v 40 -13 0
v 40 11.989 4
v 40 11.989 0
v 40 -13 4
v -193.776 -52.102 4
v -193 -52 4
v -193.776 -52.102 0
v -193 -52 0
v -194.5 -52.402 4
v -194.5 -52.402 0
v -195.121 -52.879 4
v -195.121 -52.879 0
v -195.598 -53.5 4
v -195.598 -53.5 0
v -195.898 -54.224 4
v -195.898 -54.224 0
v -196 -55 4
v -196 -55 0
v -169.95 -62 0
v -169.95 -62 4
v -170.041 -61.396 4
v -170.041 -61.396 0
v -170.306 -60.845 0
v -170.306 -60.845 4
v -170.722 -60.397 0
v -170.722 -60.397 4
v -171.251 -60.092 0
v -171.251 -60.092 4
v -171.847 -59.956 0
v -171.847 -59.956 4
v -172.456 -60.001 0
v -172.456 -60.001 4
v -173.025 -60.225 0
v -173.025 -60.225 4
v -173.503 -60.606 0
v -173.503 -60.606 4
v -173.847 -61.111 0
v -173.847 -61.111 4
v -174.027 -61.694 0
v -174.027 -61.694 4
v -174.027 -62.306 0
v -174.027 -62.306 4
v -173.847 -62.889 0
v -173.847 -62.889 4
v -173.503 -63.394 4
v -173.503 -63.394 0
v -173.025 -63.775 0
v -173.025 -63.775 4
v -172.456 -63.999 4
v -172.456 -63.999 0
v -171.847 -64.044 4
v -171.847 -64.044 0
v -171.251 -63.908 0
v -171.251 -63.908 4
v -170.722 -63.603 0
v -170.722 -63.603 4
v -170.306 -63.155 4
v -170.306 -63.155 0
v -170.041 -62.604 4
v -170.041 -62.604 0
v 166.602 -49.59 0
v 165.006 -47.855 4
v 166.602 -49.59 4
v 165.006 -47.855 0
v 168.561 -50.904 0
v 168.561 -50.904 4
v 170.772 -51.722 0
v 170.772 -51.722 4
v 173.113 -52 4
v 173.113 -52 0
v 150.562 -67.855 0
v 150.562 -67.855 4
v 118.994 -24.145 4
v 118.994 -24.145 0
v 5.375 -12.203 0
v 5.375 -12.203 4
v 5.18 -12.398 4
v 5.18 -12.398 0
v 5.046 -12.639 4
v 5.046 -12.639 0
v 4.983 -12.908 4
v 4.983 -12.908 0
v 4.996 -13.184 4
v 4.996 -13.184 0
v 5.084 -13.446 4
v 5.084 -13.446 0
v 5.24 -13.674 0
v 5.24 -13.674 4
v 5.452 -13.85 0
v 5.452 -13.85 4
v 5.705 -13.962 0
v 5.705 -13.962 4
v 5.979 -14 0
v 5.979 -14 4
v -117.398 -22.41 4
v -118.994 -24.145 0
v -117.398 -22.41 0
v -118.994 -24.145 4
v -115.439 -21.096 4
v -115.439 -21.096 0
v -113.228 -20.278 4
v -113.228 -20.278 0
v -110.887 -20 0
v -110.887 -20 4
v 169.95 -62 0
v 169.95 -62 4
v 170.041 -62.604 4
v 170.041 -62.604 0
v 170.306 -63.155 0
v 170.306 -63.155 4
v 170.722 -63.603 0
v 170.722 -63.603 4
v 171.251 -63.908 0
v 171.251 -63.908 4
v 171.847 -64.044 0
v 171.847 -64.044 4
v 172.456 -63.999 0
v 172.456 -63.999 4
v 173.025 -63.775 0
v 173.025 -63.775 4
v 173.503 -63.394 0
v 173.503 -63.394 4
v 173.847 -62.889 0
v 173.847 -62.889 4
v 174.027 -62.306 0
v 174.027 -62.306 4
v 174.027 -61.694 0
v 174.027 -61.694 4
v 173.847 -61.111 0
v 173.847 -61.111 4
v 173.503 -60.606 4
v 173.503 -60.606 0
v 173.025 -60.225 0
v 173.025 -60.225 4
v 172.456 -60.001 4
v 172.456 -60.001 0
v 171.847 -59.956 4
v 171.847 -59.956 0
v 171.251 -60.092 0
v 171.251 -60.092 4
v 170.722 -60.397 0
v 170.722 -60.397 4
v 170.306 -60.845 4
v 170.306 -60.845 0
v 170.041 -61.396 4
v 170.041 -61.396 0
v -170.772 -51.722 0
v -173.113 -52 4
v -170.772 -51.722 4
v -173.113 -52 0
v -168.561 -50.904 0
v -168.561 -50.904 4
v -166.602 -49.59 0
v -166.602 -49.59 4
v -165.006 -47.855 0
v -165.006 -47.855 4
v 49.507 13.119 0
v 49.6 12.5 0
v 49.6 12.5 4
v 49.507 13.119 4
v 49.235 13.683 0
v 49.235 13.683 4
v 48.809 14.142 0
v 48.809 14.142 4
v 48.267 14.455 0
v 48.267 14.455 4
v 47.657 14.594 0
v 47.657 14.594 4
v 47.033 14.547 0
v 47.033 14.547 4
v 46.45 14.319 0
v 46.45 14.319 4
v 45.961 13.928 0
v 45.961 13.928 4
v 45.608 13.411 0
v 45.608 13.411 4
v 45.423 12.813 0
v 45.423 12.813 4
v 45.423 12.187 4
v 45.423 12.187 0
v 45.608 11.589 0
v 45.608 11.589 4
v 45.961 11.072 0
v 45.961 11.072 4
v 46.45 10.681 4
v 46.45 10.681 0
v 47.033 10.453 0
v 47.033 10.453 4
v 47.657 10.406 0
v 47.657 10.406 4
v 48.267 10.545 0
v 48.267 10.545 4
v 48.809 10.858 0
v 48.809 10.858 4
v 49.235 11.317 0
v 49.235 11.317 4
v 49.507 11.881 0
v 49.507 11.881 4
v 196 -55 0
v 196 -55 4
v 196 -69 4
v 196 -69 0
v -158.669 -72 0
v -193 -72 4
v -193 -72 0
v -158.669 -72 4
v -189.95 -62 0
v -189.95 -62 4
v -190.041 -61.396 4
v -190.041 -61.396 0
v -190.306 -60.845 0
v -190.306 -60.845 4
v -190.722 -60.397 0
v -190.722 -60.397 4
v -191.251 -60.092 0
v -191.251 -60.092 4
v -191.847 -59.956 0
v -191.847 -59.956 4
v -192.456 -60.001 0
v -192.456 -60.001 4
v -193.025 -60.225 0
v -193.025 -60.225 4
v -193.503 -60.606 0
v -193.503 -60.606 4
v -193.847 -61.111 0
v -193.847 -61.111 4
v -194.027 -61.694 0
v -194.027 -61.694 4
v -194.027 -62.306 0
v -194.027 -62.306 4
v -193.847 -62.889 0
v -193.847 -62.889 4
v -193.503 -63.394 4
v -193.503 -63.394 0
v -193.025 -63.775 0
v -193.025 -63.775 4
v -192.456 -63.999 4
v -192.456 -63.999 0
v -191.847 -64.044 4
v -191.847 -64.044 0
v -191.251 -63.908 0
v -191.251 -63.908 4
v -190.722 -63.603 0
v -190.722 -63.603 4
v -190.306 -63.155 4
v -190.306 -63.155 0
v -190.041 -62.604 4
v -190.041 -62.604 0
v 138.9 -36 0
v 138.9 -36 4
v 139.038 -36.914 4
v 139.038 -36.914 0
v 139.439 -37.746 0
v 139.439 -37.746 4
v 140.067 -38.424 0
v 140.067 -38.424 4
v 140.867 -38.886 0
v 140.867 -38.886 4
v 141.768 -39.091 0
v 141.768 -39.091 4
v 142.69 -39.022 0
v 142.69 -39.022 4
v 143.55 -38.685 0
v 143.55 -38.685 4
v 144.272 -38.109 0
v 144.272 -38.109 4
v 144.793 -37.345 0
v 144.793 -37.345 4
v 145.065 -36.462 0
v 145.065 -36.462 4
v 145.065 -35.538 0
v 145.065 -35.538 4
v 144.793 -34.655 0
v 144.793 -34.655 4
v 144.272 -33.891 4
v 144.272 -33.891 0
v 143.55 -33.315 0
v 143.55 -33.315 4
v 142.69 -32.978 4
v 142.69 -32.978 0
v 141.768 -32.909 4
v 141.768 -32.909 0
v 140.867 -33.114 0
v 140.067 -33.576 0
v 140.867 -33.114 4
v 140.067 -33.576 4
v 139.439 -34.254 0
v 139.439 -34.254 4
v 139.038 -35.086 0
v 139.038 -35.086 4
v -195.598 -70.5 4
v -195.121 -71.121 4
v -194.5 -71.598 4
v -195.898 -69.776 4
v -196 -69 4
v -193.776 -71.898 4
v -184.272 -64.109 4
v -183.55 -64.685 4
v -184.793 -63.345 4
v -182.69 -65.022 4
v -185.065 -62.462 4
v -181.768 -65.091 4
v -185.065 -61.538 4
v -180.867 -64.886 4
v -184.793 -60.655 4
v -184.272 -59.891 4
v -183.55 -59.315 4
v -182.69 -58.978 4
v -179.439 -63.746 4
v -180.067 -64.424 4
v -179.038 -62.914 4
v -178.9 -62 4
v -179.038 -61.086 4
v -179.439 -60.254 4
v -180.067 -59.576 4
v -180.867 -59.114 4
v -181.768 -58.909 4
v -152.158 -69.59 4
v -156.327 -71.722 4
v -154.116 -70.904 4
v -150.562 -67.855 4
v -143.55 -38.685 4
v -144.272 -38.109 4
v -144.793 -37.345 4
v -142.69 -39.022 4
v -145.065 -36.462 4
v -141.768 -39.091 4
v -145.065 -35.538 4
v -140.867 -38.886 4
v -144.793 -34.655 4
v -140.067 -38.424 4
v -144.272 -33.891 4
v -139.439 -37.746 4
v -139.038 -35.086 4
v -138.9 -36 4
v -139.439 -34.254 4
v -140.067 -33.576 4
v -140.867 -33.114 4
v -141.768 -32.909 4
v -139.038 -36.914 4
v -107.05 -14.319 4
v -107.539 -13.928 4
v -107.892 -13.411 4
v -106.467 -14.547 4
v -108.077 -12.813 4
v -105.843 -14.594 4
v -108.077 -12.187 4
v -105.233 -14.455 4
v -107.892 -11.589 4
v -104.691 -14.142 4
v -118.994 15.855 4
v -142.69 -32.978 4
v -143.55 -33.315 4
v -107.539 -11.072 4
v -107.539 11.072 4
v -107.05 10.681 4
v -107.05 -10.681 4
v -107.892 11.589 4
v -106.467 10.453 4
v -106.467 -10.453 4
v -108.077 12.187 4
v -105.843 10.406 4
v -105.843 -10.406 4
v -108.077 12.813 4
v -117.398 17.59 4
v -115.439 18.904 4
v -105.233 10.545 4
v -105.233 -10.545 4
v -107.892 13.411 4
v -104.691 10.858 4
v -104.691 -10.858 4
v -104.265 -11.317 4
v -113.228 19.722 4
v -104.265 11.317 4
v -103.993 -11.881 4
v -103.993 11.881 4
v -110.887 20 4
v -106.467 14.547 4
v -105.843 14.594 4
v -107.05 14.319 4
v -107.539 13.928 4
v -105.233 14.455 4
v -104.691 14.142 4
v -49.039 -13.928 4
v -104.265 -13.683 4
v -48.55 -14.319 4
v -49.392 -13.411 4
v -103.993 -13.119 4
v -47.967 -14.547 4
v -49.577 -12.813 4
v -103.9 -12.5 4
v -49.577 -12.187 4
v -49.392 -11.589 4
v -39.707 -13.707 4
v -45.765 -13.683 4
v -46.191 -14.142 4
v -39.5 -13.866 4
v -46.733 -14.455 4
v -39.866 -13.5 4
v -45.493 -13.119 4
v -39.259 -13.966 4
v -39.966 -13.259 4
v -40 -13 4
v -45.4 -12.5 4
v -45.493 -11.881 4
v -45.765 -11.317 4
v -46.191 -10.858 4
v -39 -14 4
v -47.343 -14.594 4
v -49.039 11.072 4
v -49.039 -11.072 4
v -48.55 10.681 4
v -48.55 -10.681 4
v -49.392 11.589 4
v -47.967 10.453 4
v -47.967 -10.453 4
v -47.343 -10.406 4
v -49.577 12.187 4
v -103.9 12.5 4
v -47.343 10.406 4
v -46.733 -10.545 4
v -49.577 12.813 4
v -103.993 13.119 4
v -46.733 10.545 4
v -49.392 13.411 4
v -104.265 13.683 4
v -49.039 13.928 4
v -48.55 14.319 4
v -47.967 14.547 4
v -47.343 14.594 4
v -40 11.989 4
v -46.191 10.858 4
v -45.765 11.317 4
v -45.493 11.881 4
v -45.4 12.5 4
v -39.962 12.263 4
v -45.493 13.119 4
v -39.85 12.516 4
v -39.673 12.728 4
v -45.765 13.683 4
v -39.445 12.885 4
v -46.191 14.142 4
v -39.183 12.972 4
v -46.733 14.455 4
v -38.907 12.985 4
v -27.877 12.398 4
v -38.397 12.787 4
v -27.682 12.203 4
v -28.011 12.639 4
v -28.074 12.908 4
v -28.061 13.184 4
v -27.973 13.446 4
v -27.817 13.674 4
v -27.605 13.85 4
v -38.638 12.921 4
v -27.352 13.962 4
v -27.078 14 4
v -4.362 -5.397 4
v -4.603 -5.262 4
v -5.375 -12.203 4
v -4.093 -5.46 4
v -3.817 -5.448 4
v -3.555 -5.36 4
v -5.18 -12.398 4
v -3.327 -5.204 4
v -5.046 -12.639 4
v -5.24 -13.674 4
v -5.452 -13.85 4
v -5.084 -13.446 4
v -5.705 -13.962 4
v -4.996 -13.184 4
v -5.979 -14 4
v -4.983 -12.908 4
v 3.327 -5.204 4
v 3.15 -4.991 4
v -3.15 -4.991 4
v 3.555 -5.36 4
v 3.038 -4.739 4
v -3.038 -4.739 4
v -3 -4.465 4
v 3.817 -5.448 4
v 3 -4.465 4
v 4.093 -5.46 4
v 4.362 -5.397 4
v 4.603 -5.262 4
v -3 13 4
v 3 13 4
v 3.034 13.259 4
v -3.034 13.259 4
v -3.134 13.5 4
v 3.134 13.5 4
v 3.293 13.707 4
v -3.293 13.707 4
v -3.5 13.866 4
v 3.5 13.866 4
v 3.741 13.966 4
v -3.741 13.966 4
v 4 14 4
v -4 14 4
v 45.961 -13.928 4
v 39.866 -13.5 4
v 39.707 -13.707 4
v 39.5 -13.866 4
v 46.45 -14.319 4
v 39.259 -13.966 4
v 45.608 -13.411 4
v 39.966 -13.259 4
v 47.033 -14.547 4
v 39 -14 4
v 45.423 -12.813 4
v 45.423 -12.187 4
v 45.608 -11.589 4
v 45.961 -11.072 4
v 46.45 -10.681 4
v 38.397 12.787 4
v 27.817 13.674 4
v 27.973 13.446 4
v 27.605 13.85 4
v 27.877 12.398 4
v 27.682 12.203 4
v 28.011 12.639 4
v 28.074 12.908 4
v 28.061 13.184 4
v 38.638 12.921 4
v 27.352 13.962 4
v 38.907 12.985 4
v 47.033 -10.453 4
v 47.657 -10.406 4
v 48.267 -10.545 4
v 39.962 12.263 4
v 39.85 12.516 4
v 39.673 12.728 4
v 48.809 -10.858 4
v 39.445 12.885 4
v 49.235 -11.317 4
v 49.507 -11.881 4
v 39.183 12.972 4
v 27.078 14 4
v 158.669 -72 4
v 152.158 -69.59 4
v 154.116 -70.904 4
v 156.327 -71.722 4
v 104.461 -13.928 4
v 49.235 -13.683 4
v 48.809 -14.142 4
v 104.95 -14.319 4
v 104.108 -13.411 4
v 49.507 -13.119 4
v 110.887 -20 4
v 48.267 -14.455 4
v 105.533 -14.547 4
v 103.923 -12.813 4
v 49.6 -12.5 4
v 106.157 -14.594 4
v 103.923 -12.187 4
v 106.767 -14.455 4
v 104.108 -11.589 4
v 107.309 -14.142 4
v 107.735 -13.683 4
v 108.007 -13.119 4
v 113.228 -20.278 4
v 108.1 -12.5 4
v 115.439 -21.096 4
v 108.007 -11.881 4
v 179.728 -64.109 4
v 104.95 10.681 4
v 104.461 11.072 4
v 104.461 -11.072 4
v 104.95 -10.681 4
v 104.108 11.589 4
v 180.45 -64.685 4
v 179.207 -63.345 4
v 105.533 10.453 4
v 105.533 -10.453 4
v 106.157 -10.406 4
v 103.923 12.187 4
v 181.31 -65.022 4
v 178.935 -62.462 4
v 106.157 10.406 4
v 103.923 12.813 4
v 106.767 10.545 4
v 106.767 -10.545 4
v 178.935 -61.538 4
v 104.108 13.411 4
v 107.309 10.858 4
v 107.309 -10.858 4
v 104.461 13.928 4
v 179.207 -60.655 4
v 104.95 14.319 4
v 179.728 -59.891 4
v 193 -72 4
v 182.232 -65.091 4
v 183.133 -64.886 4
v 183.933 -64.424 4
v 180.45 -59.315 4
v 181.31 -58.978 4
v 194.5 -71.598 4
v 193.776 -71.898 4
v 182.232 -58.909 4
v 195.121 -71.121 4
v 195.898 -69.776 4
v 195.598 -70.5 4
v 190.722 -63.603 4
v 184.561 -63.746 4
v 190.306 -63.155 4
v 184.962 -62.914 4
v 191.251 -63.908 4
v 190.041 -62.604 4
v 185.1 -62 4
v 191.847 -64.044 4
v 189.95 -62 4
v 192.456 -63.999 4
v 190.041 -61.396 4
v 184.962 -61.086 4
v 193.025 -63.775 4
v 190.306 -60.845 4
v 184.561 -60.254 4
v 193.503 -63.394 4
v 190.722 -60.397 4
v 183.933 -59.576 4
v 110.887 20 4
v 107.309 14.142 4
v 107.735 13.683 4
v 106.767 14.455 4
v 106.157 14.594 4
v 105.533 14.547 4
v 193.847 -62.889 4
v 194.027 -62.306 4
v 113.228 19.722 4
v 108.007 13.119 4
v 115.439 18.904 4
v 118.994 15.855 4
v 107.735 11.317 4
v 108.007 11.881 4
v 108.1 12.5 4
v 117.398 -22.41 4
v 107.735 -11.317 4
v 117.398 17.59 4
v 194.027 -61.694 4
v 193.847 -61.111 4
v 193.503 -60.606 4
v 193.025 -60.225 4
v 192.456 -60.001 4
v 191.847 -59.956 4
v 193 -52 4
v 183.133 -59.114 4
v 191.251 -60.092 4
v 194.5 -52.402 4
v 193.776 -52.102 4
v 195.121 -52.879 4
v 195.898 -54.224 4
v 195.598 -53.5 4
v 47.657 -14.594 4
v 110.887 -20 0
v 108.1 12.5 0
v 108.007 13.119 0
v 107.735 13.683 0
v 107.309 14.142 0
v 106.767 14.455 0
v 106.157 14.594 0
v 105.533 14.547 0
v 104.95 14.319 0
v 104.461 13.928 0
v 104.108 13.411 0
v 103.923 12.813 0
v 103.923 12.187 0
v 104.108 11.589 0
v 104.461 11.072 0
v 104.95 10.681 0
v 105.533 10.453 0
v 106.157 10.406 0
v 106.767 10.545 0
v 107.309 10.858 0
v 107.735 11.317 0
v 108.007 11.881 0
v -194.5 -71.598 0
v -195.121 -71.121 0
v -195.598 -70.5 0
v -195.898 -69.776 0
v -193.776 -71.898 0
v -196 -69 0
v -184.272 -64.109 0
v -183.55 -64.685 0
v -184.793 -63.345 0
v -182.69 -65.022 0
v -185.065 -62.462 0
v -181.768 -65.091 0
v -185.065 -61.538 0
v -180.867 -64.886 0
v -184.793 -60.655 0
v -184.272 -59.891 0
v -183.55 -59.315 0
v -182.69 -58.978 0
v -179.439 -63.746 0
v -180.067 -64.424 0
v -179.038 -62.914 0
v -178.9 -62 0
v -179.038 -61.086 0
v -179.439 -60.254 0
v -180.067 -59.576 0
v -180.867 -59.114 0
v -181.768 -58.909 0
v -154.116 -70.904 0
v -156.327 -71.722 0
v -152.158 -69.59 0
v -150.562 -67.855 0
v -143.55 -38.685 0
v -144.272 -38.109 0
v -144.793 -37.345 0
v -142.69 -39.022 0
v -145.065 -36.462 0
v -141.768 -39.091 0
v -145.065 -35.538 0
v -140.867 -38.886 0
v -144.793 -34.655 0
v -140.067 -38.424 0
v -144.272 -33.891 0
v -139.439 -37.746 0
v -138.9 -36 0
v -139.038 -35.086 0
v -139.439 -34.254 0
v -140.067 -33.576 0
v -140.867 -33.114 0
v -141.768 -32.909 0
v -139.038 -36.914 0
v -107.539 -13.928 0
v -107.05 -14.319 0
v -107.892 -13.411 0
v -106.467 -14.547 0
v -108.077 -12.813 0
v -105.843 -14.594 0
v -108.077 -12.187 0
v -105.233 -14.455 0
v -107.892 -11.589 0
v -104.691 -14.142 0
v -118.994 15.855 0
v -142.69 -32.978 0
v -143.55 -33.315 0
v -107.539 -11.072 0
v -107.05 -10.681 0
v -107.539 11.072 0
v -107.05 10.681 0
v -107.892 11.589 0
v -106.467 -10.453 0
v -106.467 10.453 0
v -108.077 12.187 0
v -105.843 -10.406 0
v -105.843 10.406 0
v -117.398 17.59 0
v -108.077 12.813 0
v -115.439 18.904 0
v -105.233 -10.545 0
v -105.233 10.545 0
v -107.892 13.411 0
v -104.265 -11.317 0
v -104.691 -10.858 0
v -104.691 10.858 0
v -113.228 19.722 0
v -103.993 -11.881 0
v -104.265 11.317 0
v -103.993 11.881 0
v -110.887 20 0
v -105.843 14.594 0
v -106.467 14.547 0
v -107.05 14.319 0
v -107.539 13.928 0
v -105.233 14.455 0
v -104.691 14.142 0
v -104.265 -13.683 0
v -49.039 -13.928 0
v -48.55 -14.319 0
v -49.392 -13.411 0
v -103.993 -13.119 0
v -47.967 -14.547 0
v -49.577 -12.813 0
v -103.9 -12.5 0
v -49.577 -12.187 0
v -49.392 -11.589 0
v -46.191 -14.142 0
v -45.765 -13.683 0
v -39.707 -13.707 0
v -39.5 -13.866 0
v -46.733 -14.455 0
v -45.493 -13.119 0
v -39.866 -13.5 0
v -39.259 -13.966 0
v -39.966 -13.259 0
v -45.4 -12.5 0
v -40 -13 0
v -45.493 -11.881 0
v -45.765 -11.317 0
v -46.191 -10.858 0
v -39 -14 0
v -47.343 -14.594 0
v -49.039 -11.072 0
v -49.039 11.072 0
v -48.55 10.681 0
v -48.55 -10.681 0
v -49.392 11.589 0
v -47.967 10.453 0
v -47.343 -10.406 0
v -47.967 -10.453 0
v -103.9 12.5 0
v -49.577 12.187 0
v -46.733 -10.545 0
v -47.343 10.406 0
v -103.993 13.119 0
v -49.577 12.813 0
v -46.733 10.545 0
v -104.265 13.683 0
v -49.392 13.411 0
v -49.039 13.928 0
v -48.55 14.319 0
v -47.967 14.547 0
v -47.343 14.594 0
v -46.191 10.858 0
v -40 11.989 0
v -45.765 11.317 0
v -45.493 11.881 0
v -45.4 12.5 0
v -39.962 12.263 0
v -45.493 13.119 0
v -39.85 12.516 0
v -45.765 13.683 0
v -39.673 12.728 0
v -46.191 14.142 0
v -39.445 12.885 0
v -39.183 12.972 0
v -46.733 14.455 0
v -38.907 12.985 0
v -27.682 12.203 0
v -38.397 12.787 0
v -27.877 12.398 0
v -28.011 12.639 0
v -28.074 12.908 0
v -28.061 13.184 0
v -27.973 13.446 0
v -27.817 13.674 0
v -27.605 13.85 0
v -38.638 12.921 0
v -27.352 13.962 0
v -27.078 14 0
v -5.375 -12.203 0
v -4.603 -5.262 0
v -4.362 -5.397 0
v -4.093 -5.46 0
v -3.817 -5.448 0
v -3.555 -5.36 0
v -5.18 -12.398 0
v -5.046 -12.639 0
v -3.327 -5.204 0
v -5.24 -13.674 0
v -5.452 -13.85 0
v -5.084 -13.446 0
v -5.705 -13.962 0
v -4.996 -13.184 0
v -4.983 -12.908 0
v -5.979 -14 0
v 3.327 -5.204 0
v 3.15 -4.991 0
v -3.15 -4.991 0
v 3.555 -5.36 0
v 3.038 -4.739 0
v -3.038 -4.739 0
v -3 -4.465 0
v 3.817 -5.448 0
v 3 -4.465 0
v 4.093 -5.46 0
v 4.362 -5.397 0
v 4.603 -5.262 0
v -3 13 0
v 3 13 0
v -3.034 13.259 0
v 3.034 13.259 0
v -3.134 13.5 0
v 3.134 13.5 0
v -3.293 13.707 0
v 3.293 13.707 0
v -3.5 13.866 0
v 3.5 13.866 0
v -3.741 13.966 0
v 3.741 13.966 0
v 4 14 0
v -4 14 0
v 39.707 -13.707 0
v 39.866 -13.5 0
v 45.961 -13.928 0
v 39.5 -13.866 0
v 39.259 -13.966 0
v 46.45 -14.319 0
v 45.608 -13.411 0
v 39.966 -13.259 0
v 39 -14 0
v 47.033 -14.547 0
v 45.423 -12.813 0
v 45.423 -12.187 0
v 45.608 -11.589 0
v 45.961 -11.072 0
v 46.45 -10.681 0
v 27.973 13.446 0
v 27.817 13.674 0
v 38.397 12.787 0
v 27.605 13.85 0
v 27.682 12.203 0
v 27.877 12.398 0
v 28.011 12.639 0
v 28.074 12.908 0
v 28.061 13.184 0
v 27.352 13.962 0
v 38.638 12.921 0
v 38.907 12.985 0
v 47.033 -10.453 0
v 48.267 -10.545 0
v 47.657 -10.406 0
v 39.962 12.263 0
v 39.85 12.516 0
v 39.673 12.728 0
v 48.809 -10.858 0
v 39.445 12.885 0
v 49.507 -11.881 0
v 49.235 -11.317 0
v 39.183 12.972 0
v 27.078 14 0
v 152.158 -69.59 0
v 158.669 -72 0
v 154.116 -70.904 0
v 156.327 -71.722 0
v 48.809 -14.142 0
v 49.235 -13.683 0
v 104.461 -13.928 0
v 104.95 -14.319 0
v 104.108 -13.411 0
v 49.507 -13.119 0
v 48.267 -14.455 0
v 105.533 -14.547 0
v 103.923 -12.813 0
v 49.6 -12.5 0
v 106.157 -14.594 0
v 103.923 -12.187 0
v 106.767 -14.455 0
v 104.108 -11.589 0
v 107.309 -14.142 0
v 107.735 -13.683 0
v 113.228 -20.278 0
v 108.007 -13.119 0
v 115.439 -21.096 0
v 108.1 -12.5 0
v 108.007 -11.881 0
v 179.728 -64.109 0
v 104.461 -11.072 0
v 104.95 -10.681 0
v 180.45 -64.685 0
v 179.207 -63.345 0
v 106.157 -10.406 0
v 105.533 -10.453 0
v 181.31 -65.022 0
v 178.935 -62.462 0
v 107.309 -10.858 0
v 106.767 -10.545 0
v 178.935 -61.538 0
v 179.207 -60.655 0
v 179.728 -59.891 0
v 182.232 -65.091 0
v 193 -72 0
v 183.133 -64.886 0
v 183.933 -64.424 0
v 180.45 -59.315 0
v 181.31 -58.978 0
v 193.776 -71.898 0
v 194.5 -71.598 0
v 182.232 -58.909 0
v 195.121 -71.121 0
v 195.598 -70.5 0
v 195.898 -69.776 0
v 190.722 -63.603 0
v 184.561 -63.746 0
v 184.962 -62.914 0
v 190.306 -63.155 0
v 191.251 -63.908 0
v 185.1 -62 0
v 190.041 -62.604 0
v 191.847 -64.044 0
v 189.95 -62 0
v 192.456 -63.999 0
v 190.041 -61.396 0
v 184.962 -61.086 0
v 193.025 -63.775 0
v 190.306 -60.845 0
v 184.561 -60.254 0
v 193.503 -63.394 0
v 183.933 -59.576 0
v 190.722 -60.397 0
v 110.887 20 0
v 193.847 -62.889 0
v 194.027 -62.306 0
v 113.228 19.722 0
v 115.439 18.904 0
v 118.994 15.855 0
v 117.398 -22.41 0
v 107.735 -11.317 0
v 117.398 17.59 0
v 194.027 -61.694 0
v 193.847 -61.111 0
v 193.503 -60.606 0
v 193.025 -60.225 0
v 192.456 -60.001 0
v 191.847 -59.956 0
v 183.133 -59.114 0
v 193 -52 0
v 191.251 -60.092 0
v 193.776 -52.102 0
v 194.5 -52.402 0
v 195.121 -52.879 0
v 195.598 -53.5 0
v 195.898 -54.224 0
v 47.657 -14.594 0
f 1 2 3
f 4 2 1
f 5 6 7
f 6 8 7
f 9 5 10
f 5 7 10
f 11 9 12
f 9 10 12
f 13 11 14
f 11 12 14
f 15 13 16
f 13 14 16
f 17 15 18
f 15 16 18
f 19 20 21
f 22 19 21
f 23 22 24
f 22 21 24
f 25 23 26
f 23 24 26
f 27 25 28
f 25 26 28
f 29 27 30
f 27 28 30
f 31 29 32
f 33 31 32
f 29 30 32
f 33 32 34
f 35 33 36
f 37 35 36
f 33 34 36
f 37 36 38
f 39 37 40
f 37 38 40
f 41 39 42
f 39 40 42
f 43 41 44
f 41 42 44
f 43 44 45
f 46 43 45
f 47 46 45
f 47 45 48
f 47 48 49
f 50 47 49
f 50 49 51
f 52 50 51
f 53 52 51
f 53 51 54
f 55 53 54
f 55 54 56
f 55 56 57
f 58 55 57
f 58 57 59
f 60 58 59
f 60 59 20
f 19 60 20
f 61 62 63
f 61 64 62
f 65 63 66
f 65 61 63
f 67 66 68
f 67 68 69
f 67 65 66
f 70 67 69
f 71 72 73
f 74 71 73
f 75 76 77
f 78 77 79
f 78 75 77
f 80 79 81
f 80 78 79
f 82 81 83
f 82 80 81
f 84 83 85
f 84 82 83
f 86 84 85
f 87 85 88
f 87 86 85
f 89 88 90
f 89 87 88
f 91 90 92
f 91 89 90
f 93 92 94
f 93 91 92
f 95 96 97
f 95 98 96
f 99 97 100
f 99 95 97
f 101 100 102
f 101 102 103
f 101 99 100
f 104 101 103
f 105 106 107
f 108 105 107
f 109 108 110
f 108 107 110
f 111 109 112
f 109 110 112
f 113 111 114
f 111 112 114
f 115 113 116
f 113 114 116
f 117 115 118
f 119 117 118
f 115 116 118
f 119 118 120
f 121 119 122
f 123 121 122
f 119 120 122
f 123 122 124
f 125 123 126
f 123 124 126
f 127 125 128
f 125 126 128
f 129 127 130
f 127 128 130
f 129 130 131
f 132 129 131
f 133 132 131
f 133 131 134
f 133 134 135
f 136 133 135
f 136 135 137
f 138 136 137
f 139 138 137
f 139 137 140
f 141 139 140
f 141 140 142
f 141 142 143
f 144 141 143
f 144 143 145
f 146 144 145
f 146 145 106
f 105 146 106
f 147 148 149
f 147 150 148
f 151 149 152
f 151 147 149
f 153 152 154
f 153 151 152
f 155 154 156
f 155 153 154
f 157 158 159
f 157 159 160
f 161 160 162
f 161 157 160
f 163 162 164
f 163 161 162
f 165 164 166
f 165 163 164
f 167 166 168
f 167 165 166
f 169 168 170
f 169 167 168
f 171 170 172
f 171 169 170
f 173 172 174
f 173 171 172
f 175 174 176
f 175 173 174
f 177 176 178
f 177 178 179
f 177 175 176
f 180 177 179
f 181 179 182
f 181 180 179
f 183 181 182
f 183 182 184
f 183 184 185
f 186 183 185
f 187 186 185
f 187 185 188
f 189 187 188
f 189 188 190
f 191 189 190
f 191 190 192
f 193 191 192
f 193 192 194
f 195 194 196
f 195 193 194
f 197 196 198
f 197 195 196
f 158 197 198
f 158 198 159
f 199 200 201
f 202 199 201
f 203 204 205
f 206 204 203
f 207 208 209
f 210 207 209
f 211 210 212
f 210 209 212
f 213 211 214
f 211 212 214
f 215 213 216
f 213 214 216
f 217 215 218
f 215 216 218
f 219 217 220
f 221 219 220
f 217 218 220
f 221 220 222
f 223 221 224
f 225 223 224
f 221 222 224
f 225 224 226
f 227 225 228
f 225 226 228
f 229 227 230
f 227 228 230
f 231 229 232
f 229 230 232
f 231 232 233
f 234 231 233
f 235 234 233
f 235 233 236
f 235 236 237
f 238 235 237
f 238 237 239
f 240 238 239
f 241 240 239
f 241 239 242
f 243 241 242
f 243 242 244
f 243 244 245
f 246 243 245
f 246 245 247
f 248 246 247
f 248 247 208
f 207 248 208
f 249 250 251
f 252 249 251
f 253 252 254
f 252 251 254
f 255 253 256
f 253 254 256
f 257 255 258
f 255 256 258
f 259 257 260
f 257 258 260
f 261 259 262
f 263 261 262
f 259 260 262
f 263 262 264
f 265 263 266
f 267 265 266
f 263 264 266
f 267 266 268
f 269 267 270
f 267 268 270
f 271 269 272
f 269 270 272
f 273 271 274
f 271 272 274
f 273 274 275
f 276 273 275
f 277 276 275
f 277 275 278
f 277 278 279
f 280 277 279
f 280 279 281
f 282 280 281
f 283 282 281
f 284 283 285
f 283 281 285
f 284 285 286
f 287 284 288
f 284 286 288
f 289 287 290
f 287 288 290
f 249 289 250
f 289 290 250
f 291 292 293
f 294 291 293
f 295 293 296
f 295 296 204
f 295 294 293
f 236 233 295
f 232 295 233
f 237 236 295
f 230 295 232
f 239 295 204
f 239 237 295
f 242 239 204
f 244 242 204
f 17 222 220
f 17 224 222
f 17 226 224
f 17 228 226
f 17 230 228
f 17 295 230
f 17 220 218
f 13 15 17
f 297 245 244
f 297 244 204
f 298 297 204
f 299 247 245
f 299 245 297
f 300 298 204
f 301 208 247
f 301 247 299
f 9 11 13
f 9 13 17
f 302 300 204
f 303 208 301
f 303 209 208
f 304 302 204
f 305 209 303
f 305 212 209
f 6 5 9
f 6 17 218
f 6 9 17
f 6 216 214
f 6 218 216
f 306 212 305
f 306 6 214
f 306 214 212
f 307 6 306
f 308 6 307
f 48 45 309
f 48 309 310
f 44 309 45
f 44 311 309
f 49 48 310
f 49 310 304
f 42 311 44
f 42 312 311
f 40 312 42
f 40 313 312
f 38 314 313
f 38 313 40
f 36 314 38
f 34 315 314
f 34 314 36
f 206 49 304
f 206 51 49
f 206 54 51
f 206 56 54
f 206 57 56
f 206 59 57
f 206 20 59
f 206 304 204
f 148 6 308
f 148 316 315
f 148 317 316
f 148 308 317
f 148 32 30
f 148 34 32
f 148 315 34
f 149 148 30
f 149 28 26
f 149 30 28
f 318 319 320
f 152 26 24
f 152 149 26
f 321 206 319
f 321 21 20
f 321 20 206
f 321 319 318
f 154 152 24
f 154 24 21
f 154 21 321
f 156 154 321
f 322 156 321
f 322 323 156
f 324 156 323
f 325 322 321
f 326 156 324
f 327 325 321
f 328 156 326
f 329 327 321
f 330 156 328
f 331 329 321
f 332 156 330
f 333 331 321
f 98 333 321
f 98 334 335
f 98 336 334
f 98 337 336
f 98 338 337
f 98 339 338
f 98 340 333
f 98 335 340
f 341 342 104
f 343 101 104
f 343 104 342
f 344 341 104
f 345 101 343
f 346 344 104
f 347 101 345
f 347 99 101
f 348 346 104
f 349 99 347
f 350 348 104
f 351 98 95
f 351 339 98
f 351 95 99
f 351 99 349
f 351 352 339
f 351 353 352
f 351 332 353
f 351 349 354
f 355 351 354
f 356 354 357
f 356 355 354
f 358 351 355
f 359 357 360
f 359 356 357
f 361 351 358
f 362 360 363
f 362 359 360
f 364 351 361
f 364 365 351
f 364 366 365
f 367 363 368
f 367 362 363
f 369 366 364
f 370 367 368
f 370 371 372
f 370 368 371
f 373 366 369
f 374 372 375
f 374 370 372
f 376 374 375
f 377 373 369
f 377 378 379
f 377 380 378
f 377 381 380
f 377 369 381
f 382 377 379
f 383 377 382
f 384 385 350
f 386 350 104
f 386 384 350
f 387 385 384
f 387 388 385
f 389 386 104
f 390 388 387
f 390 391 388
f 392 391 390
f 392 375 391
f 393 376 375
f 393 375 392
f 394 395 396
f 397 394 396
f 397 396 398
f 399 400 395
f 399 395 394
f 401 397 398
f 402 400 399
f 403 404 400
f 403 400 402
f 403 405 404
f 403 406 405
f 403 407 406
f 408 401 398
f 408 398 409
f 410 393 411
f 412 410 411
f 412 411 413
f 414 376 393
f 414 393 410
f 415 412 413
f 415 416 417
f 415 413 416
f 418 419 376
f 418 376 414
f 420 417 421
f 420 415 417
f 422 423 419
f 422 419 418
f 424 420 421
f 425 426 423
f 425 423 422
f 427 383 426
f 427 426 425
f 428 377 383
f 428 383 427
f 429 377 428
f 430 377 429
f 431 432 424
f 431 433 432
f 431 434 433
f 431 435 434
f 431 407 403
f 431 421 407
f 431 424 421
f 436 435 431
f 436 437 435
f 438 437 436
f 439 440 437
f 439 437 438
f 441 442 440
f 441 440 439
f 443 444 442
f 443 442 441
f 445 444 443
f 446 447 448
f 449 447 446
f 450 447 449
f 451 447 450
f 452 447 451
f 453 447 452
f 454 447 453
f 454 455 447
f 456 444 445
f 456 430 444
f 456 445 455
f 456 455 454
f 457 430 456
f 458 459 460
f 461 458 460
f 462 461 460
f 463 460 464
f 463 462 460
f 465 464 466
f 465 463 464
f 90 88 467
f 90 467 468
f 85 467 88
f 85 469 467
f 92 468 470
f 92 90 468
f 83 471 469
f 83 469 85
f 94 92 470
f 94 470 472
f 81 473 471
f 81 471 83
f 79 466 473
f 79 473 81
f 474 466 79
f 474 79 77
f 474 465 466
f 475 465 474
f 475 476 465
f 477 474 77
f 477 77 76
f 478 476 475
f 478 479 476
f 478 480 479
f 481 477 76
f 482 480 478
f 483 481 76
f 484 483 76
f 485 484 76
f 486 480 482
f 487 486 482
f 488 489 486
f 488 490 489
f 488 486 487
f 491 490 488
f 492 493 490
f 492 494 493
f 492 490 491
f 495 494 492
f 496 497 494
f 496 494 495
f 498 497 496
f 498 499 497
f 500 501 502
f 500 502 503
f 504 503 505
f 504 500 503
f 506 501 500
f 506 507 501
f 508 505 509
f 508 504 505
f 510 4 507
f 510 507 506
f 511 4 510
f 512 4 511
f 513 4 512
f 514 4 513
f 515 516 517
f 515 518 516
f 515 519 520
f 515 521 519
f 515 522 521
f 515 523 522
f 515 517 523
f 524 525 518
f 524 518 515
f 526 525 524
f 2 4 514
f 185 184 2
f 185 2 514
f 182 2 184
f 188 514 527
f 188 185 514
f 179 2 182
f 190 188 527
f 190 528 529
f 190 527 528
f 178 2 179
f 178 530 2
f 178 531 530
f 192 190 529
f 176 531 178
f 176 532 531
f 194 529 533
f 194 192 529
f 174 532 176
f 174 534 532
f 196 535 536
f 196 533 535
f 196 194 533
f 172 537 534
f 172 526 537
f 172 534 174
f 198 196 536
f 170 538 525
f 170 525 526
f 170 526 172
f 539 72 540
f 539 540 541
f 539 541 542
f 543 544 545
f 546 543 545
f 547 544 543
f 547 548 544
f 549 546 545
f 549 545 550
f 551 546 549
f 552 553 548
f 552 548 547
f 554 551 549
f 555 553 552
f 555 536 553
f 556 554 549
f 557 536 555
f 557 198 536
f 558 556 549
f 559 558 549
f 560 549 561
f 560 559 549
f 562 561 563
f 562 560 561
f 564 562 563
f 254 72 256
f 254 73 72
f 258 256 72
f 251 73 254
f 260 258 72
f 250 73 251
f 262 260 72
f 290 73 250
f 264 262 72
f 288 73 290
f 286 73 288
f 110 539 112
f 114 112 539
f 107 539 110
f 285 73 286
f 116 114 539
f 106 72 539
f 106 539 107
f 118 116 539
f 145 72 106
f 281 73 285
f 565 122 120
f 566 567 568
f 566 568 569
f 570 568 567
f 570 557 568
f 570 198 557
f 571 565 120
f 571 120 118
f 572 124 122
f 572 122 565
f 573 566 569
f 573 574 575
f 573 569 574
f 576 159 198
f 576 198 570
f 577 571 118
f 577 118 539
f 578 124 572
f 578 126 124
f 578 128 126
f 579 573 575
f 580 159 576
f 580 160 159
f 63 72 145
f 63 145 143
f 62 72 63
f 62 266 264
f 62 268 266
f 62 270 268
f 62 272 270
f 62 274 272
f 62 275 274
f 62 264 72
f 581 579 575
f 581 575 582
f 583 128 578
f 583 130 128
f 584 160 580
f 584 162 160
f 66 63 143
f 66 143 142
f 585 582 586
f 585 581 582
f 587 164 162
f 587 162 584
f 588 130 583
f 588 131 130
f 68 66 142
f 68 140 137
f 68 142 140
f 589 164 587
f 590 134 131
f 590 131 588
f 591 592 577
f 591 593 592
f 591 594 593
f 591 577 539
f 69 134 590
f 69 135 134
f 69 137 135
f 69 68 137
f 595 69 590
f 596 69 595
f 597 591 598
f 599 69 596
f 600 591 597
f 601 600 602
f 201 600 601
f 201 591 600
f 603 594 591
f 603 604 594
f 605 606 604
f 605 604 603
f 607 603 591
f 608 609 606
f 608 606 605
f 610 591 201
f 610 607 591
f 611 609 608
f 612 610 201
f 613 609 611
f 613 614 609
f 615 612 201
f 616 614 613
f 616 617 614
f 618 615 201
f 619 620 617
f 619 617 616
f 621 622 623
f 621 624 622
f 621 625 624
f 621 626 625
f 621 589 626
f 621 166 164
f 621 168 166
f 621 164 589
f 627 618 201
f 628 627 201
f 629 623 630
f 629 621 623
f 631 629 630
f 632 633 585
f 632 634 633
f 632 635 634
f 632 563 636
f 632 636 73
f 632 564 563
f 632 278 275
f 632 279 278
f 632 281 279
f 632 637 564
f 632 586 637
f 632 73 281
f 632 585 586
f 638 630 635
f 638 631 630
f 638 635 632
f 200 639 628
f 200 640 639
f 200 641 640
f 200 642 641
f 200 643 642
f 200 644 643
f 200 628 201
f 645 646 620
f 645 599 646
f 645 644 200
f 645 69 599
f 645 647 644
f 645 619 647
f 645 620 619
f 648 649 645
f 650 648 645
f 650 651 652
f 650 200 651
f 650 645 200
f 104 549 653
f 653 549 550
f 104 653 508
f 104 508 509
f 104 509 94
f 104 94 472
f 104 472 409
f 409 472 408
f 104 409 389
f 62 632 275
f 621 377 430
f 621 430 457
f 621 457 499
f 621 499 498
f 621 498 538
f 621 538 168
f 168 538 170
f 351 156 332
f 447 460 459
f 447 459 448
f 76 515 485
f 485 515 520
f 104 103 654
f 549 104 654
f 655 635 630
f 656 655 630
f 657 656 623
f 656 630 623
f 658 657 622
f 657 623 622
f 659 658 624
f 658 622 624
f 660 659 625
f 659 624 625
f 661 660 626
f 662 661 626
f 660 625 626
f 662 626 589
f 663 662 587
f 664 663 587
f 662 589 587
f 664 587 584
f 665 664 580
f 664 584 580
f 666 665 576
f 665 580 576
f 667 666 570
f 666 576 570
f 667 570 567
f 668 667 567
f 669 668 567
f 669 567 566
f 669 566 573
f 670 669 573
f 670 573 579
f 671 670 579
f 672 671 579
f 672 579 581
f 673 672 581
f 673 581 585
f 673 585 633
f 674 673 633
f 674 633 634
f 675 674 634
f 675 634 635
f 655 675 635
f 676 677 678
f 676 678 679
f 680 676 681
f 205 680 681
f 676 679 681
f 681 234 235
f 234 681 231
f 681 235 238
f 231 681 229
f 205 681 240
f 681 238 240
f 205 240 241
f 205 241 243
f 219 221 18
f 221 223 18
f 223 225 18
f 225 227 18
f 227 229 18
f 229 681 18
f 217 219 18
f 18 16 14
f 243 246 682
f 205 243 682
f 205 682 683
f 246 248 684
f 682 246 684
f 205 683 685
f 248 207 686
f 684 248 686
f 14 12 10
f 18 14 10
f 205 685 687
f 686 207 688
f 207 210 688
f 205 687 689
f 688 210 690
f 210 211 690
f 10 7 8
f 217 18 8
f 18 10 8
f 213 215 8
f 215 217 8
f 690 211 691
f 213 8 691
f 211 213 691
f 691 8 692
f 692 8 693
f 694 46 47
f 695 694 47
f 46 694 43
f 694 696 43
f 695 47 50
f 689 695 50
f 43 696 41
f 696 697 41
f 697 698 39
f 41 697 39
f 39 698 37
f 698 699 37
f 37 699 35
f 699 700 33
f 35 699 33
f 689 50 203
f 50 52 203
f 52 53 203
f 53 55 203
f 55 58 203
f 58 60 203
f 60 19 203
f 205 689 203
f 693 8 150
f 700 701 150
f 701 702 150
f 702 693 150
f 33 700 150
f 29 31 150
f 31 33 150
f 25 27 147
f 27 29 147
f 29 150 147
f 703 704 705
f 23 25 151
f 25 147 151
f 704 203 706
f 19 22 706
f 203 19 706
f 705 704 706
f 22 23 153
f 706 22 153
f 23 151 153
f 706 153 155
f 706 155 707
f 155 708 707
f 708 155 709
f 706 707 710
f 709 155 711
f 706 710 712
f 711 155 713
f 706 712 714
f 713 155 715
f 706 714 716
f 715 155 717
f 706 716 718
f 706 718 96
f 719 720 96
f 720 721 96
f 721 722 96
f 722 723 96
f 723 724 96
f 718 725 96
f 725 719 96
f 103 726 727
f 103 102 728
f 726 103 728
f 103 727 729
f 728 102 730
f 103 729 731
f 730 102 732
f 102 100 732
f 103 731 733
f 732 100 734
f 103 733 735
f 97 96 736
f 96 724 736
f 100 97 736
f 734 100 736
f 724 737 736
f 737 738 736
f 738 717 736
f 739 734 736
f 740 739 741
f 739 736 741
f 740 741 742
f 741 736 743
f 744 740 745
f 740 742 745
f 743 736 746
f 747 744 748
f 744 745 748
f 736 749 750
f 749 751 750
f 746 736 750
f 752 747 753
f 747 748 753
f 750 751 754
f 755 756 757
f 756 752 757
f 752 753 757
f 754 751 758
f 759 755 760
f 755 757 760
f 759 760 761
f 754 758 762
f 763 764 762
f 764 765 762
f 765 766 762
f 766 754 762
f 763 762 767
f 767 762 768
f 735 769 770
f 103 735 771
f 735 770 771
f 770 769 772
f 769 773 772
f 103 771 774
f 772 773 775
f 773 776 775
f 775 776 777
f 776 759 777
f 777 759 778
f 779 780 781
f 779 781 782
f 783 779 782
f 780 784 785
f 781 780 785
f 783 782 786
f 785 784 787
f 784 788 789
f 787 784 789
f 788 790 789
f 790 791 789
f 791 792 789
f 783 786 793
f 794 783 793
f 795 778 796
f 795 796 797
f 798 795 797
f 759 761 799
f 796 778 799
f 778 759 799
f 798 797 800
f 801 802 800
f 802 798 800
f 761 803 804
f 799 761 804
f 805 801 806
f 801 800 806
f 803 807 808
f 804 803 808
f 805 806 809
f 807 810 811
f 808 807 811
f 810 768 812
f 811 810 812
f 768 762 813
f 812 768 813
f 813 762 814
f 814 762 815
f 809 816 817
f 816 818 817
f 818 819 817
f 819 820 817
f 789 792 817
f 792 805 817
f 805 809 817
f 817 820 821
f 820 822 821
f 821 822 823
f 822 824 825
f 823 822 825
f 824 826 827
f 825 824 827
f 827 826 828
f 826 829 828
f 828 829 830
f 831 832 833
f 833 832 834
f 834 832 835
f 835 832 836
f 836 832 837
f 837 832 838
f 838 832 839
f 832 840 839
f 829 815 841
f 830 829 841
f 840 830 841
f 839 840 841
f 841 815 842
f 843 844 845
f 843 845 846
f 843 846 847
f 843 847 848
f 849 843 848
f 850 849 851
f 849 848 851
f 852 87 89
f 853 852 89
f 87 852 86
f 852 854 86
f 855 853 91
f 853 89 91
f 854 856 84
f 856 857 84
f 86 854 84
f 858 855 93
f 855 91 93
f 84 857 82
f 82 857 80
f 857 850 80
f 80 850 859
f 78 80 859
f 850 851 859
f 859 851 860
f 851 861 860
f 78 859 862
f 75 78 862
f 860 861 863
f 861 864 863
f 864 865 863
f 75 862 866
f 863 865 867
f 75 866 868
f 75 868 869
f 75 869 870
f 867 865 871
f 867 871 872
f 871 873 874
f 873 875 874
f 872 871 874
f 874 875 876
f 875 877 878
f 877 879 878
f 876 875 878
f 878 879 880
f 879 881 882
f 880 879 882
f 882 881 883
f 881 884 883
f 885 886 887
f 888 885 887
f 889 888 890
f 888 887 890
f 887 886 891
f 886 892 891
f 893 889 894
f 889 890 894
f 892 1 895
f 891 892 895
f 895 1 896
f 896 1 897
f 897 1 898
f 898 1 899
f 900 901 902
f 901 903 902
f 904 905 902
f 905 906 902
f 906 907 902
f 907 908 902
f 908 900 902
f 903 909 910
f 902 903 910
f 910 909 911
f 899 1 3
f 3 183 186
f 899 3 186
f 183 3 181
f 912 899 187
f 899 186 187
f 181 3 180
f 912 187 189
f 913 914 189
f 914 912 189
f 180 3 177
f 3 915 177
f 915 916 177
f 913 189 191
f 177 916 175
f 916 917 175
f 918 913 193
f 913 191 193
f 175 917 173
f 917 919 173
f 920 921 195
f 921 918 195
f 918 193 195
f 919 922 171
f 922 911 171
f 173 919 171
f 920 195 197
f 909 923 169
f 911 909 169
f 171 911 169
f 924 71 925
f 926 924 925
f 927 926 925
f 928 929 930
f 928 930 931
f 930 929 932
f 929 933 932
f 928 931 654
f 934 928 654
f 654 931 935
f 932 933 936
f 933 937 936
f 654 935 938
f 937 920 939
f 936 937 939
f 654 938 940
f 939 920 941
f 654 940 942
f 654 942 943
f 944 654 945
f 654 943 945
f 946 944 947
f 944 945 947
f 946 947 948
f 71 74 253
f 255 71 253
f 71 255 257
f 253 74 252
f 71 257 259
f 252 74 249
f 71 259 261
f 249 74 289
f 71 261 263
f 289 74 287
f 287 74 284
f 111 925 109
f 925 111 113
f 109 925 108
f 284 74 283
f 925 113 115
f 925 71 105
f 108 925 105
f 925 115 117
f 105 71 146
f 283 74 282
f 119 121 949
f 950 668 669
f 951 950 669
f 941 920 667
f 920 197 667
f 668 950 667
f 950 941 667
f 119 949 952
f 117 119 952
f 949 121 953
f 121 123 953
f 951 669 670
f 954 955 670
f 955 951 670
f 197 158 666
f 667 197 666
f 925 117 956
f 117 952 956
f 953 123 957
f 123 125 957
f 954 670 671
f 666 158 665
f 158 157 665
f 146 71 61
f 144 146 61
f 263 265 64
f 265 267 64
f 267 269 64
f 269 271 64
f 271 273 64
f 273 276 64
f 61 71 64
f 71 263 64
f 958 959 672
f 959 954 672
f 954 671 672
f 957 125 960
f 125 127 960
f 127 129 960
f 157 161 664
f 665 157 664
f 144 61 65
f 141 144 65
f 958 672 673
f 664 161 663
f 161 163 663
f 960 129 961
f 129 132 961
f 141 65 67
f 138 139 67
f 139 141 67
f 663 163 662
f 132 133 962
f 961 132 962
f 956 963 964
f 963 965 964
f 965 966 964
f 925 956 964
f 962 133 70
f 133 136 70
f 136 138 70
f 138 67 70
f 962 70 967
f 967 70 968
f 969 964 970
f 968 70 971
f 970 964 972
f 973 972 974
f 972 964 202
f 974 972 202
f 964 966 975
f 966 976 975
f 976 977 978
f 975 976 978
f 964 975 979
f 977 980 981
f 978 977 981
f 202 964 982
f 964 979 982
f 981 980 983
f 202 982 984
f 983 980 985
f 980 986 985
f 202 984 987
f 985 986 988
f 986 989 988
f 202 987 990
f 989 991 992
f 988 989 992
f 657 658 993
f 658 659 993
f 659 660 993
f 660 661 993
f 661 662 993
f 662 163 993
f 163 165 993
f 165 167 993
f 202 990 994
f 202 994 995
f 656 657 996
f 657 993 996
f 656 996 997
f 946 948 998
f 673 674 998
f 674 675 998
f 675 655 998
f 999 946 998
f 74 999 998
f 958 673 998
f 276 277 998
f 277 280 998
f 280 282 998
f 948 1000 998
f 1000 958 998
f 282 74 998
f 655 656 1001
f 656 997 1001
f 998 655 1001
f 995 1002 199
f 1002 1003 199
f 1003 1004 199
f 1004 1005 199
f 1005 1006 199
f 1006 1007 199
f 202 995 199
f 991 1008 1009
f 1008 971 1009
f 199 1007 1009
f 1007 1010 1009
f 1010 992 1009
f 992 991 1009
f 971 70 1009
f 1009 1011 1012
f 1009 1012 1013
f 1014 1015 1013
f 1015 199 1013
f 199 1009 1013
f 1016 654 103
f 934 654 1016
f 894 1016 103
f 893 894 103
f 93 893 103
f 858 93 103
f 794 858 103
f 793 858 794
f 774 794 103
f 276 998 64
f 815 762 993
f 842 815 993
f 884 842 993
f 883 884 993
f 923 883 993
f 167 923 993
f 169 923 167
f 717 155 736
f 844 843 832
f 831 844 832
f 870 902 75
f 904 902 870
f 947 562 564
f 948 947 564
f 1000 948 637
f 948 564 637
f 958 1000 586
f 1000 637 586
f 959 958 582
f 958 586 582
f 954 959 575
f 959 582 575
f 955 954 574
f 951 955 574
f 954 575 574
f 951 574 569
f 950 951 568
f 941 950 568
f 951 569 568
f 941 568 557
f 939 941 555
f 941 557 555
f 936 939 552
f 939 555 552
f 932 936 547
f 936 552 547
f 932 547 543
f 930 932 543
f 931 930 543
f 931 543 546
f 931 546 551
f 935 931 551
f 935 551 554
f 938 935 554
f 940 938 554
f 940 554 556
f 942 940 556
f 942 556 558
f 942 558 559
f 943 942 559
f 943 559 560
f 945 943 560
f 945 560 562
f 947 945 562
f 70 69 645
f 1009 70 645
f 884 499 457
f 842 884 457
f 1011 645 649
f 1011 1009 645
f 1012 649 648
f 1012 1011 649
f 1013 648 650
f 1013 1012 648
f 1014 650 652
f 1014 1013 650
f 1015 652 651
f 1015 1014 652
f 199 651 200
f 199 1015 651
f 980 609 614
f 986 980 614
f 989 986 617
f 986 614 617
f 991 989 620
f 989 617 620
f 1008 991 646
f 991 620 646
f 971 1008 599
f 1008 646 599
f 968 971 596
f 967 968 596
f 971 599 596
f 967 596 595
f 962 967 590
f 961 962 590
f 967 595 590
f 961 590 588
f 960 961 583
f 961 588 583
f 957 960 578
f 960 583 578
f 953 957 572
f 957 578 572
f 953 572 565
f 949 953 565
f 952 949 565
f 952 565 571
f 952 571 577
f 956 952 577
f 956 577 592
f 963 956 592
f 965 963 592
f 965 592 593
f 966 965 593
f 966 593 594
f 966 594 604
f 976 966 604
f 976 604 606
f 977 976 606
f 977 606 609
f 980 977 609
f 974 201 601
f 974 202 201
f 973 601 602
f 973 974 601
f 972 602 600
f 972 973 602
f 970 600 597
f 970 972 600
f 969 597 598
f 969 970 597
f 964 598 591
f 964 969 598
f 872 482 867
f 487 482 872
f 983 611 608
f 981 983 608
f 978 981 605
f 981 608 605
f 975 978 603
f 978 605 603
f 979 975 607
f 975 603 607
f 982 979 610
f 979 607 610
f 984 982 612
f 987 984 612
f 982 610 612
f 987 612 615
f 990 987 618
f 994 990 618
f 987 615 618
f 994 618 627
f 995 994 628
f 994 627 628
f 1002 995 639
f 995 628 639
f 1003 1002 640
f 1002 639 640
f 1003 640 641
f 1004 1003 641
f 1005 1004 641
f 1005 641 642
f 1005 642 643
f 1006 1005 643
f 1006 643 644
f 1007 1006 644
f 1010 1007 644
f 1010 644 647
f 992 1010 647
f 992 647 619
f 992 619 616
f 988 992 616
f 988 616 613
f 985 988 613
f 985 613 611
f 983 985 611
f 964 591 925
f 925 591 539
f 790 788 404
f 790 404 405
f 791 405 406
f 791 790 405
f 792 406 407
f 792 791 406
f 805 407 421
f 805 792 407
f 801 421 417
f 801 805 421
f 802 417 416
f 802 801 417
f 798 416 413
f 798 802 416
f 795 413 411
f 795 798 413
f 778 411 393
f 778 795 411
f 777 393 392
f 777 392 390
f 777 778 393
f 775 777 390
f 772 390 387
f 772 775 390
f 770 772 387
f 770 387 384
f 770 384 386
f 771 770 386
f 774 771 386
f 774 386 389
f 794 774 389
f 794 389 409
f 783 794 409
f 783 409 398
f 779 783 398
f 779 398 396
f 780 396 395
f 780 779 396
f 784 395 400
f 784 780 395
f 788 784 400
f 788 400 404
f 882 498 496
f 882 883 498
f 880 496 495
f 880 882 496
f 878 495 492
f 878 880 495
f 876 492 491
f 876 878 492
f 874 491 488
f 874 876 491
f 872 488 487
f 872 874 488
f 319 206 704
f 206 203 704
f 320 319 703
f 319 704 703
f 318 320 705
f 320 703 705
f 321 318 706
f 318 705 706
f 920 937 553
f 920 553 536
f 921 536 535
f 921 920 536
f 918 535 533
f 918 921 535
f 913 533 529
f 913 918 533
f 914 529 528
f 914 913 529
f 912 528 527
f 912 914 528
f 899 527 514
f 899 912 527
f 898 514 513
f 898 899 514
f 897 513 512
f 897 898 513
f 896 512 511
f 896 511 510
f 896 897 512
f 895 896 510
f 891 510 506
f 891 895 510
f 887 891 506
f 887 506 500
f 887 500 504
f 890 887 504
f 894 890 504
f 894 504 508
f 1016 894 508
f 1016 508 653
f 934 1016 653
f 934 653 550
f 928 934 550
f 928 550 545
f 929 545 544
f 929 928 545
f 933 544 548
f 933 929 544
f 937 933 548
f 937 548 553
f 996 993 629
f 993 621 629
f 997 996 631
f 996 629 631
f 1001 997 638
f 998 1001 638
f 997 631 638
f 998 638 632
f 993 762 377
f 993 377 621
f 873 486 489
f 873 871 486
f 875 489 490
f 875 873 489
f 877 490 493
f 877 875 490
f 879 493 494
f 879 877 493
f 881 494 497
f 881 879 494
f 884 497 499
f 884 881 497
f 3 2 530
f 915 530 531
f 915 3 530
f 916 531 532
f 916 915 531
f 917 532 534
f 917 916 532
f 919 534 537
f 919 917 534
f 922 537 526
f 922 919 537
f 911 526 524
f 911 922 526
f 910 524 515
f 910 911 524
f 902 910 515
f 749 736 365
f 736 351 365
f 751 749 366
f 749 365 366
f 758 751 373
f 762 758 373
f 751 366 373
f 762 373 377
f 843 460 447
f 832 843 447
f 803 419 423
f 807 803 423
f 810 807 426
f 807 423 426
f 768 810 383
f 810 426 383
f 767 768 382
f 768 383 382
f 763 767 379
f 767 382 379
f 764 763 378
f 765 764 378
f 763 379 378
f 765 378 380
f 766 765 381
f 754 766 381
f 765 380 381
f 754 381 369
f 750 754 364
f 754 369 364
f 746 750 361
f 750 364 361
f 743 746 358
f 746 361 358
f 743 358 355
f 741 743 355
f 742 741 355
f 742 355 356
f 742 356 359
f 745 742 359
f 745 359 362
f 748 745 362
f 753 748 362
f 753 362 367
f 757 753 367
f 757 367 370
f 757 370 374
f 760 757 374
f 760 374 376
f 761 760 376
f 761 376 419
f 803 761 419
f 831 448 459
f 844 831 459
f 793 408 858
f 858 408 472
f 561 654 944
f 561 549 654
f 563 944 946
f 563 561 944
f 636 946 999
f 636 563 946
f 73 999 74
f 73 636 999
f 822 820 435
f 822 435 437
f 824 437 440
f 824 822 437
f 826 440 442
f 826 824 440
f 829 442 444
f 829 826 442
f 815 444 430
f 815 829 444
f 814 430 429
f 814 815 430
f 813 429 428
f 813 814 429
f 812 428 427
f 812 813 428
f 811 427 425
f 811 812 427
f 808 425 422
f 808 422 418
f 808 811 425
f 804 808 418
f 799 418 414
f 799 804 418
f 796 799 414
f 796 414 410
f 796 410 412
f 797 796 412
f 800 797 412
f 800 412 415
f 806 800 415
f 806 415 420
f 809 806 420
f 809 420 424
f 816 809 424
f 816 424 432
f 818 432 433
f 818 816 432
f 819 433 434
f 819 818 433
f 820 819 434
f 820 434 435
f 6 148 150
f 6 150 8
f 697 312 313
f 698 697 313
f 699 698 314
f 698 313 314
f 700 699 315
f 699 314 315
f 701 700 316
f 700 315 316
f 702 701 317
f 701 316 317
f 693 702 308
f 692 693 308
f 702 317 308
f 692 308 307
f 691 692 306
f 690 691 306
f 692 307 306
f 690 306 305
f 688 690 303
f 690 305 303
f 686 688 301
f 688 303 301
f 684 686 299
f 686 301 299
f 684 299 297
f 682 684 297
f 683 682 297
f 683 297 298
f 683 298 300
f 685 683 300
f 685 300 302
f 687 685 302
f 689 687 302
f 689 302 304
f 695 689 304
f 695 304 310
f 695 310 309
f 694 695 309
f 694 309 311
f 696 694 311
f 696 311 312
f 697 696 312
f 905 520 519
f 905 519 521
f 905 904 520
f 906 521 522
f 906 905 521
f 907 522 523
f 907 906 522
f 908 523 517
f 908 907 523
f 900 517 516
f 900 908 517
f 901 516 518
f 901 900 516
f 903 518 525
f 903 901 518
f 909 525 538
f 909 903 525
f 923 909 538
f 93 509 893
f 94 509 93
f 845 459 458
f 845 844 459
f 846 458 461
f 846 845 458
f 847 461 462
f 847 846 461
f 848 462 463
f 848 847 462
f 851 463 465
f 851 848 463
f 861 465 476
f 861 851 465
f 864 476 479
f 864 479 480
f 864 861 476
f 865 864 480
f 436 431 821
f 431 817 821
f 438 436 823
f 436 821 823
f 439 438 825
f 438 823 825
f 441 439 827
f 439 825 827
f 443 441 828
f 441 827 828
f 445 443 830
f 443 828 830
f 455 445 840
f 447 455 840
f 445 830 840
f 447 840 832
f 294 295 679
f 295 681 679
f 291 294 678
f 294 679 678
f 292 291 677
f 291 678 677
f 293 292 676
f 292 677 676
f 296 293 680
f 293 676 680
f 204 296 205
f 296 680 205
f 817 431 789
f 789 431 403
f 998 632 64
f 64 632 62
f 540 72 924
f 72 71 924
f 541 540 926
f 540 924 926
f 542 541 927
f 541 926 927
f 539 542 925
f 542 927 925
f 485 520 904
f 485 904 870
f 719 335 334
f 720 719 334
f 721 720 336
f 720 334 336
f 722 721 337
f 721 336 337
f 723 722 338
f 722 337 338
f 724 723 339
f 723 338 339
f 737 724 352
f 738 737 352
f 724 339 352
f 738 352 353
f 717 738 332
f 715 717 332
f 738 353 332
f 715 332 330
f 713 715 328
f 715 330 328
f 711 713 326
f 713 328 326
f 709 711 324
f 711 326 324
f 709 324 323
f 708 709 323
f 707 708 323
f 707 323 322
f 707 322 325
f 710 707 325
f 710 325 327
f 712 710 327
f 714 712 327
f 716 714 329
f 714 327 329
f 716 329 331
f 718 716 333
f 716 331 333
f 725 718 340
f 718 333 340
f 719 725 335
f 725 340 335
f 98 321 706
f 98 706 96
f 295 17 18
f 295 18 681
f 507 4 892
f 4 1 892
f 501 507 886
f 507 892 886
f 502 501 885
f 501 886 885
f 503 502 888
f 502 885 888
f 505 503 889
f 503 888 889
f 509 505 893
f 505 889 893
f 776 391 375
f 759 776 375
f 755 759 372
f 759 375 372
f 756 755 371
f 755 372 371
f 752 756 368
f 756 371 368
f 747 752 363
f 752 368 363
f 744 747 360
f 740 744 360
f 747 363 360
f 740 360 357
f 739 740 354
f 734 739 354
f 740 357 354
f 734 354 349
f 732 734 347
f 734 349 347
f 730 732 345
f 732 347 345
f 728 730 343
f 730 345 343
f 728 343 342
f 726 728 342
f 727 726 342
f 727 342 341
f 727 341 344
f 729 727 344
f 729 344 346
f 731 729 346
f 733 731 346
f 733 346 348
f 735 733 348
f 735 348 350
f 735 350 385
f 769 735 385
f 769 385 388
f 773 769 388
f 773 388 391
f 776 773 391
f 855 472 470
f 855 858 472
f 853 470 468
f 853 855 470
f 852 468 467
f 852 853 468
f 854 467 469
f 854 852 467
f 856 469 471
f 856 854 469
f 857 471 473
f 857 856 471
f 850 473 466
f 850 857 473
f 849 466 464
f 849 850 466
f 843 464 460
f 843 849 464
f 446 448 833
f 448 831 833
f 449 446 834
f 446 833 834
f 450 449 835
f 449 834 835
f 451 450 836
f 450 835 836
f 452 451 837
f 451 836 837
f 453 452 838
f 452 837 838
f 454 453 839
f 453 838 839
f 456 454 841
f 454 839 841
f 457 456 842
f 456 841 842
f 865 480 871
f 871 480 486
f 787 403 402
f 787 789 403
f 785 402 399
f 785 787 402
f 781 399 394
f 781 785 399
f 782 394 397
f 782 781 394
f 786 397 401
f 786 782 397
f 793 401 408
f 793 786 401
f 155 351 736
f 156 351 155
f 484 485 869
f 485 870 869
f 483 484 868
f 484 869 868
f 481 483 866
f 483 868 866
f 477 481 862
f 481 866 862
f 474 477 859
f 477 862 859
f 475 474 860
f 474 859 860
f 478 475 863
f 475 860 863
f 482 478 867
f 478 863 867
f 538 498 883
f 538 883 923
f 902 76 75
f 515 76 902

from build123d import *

# Parameters (mm, degrees)
SKETCH_1_W          = 232
SKETCH_1_H          = 40
SKETCH_1_R          = 2.1
EXTRUDE_1_DEPTH     = 4
SKETCH_2_R          = 3.1
EXTRUDE_2_DEPTH     = 4
SKETCH_4_R          = 2.1
CUT_EXTRUDE_2_DEPTH = 10
FILLET_1_R          = 3
FILLET_2_R          = 10
SKETCH_6_R          = 2.05
SKETCH_6_R_2        = 3.1
CUT_EXTRUDE_4_DEPTH = 209.844439715
CUT_EXTRUDE_5_DEPTH = 10
FILLET_3_R          = 1


with BuildPart() as part:
    # 草图1 → 凸台-拉伸1 (new body)
    with BuildSketch(Plane.XY):
        Rectangle(SKETCH_1_W, SKETCH_1_H)
        with Locations((-47.5, 12.5)):
            Circle(SKETCH_1_R, mode=Mode.SUBTRACT)
        with Locations((47.5, 12.5)):
            Circle(SKETCH_1_R, mode=Mode.SUBTRACT)
        with Locations((-47.5, -12.5)):
            Circle(SKETCH_1_R, mode=Mode.SUBTRACT)
        with Locations((47.5, -12.5)):
            Circle(SKETCH_1_R, mode=Mode.SUBTRACT)
    extrude(amount=EXTRUDE_1_DEPTH)

    # 草图2 → 凸台-拉伸2 (add)
    # profile 1 of 2: a face of its own
    with BuildSketch(Plane.XY.offset(4)):
        Polygon((-116, 20), (-168, -52), (-196, -52), (-196, -72), (-153.555555556, -72), (-116, -20), align=None)
        with Locations((-142, -36)):
            Circle(SKETCH_2_R, mode=Mode.SUBTRACT)
    # profile 2 of 2: a face of its own
    with BuildSketch(Plane.XY.offset(4)):
        Polygon((116, 20), (168, -52), (196, -52), (196, -72), (153.555555556, -72), (116, -20), align=None)
        with Locations(Location((142, -36, 0), (0, 0, 180))):
            Circle(SKETCH_2_R, mode=Mode.SUBTRACT)
    extrude(amount=-EXTRUDE_2_DEPTH)

    # 草图4 → 切除-拉伸2 (cut)
    with BuildSketch(Plane.XY.offset(4)):
        with Locations((-106, 12.5)):
            Circle(SKETCH_4_R)
        with Locations((-106, -12.5)):
            Circle(SKETCH_4_R)
        with Locations((106, 12.5)):
            Circle(SKETCH_4_R)
        with Locations((106, -12.5)):
            Circle(SKETCH_4_R)
    extrude(amount=-CUT_EXTRUDE_2_DEPTH, mode=Mode.SUBTRACT)

    # 圆角1
    fillet_1_edges = [part.edges().sort_by_distance(p)[0] for p in [
        (-196, -72, 2),
        (-196, -52, 2),
        (196, -52, 2),
        (196, -72, 2),
    ]]
    fillet(fillet_1_edges, radius=FILLET_1_R)

    # 圆角2
    fillet_2_edges = [part.edges().sort_by_distance(p)[0] for p in [
        (-153.555555556, -72, 2),
        (-168, -52, 2),
        (168, -52, 2),
        (153.555555556, -72, 2),
        (116, -20, 2),
        (-116, -20, 2),
        (-116, 20, 2),
        (116, 20, 2),
    ]]
    fillet(fillet_2_edges, radius=FILLET_2_R)

    # 草图6 → 切除-拉伸4 (cut, through all)
    with BuildSketch(Plane.XY.offset(4)):
        with Locations((-192, -62)):
            Circle(SKETCH_6_R)
        with Locations((-172, -62)):
            Circle(SKETCH_6_R)
        with Locations(Location((172, -62, 0), (0, 0, 180))):
            Circle(SKETCH_6_R)
        with Locations(Location((192, -62, 0), (0, 0, 180))):
            Circle(SKETCH_6_R)
        with Locations((-182, -62)):
            Circle(SKETCH_6_R_2)
        with Locations((182, -62)):
            Circle(SKETCH_6_R_2)
    extrude(amount=-CUT_EXTRUDE_4_DEPTH, mode=Mode.SUBTRACT)

    # 草图5 → 切除-拉伸5 (cut)
    with BuildSketch(Plane.XY.offset(4)):
        Polygon((-40, 14), (-40, -14), (-3, -14), align=None)
        Polygon((-30.057050493, 14), (-3, -6.475605779), (-3, 14), align=None)
        Polygon((40, -14), (3, -14), (40, 14), align=None)
        Polygon((3, -6.475605779), (3, 14), (30.057050493, 14), align=None)
    extrude(amount=-CUT_EXTRUDE_5_DEPTH, mode=Mode.SUBTRACT)

    # 圆角3
    fillet_3_edges = [part.edges().sort_by_distance(p)[0] for p in [
        (-3, 14, 2),
        (-3, -6.475605779, 2),
        (-30.057050493, 14, 2),
        (3, 14, 2),
        (30.057050493, 14, 2),
        (3, -6.475605779, 2),
        (3, -14, 2),
        (40, 14, 2),
        (40, -14, 2),
        (-3, -14, 2),
        (-40, -14, 2),
        (-40, 14, 2),
    ]]
    fillet(fillet_3_edges, radius=FILLET_3_R)


solid = part.part
